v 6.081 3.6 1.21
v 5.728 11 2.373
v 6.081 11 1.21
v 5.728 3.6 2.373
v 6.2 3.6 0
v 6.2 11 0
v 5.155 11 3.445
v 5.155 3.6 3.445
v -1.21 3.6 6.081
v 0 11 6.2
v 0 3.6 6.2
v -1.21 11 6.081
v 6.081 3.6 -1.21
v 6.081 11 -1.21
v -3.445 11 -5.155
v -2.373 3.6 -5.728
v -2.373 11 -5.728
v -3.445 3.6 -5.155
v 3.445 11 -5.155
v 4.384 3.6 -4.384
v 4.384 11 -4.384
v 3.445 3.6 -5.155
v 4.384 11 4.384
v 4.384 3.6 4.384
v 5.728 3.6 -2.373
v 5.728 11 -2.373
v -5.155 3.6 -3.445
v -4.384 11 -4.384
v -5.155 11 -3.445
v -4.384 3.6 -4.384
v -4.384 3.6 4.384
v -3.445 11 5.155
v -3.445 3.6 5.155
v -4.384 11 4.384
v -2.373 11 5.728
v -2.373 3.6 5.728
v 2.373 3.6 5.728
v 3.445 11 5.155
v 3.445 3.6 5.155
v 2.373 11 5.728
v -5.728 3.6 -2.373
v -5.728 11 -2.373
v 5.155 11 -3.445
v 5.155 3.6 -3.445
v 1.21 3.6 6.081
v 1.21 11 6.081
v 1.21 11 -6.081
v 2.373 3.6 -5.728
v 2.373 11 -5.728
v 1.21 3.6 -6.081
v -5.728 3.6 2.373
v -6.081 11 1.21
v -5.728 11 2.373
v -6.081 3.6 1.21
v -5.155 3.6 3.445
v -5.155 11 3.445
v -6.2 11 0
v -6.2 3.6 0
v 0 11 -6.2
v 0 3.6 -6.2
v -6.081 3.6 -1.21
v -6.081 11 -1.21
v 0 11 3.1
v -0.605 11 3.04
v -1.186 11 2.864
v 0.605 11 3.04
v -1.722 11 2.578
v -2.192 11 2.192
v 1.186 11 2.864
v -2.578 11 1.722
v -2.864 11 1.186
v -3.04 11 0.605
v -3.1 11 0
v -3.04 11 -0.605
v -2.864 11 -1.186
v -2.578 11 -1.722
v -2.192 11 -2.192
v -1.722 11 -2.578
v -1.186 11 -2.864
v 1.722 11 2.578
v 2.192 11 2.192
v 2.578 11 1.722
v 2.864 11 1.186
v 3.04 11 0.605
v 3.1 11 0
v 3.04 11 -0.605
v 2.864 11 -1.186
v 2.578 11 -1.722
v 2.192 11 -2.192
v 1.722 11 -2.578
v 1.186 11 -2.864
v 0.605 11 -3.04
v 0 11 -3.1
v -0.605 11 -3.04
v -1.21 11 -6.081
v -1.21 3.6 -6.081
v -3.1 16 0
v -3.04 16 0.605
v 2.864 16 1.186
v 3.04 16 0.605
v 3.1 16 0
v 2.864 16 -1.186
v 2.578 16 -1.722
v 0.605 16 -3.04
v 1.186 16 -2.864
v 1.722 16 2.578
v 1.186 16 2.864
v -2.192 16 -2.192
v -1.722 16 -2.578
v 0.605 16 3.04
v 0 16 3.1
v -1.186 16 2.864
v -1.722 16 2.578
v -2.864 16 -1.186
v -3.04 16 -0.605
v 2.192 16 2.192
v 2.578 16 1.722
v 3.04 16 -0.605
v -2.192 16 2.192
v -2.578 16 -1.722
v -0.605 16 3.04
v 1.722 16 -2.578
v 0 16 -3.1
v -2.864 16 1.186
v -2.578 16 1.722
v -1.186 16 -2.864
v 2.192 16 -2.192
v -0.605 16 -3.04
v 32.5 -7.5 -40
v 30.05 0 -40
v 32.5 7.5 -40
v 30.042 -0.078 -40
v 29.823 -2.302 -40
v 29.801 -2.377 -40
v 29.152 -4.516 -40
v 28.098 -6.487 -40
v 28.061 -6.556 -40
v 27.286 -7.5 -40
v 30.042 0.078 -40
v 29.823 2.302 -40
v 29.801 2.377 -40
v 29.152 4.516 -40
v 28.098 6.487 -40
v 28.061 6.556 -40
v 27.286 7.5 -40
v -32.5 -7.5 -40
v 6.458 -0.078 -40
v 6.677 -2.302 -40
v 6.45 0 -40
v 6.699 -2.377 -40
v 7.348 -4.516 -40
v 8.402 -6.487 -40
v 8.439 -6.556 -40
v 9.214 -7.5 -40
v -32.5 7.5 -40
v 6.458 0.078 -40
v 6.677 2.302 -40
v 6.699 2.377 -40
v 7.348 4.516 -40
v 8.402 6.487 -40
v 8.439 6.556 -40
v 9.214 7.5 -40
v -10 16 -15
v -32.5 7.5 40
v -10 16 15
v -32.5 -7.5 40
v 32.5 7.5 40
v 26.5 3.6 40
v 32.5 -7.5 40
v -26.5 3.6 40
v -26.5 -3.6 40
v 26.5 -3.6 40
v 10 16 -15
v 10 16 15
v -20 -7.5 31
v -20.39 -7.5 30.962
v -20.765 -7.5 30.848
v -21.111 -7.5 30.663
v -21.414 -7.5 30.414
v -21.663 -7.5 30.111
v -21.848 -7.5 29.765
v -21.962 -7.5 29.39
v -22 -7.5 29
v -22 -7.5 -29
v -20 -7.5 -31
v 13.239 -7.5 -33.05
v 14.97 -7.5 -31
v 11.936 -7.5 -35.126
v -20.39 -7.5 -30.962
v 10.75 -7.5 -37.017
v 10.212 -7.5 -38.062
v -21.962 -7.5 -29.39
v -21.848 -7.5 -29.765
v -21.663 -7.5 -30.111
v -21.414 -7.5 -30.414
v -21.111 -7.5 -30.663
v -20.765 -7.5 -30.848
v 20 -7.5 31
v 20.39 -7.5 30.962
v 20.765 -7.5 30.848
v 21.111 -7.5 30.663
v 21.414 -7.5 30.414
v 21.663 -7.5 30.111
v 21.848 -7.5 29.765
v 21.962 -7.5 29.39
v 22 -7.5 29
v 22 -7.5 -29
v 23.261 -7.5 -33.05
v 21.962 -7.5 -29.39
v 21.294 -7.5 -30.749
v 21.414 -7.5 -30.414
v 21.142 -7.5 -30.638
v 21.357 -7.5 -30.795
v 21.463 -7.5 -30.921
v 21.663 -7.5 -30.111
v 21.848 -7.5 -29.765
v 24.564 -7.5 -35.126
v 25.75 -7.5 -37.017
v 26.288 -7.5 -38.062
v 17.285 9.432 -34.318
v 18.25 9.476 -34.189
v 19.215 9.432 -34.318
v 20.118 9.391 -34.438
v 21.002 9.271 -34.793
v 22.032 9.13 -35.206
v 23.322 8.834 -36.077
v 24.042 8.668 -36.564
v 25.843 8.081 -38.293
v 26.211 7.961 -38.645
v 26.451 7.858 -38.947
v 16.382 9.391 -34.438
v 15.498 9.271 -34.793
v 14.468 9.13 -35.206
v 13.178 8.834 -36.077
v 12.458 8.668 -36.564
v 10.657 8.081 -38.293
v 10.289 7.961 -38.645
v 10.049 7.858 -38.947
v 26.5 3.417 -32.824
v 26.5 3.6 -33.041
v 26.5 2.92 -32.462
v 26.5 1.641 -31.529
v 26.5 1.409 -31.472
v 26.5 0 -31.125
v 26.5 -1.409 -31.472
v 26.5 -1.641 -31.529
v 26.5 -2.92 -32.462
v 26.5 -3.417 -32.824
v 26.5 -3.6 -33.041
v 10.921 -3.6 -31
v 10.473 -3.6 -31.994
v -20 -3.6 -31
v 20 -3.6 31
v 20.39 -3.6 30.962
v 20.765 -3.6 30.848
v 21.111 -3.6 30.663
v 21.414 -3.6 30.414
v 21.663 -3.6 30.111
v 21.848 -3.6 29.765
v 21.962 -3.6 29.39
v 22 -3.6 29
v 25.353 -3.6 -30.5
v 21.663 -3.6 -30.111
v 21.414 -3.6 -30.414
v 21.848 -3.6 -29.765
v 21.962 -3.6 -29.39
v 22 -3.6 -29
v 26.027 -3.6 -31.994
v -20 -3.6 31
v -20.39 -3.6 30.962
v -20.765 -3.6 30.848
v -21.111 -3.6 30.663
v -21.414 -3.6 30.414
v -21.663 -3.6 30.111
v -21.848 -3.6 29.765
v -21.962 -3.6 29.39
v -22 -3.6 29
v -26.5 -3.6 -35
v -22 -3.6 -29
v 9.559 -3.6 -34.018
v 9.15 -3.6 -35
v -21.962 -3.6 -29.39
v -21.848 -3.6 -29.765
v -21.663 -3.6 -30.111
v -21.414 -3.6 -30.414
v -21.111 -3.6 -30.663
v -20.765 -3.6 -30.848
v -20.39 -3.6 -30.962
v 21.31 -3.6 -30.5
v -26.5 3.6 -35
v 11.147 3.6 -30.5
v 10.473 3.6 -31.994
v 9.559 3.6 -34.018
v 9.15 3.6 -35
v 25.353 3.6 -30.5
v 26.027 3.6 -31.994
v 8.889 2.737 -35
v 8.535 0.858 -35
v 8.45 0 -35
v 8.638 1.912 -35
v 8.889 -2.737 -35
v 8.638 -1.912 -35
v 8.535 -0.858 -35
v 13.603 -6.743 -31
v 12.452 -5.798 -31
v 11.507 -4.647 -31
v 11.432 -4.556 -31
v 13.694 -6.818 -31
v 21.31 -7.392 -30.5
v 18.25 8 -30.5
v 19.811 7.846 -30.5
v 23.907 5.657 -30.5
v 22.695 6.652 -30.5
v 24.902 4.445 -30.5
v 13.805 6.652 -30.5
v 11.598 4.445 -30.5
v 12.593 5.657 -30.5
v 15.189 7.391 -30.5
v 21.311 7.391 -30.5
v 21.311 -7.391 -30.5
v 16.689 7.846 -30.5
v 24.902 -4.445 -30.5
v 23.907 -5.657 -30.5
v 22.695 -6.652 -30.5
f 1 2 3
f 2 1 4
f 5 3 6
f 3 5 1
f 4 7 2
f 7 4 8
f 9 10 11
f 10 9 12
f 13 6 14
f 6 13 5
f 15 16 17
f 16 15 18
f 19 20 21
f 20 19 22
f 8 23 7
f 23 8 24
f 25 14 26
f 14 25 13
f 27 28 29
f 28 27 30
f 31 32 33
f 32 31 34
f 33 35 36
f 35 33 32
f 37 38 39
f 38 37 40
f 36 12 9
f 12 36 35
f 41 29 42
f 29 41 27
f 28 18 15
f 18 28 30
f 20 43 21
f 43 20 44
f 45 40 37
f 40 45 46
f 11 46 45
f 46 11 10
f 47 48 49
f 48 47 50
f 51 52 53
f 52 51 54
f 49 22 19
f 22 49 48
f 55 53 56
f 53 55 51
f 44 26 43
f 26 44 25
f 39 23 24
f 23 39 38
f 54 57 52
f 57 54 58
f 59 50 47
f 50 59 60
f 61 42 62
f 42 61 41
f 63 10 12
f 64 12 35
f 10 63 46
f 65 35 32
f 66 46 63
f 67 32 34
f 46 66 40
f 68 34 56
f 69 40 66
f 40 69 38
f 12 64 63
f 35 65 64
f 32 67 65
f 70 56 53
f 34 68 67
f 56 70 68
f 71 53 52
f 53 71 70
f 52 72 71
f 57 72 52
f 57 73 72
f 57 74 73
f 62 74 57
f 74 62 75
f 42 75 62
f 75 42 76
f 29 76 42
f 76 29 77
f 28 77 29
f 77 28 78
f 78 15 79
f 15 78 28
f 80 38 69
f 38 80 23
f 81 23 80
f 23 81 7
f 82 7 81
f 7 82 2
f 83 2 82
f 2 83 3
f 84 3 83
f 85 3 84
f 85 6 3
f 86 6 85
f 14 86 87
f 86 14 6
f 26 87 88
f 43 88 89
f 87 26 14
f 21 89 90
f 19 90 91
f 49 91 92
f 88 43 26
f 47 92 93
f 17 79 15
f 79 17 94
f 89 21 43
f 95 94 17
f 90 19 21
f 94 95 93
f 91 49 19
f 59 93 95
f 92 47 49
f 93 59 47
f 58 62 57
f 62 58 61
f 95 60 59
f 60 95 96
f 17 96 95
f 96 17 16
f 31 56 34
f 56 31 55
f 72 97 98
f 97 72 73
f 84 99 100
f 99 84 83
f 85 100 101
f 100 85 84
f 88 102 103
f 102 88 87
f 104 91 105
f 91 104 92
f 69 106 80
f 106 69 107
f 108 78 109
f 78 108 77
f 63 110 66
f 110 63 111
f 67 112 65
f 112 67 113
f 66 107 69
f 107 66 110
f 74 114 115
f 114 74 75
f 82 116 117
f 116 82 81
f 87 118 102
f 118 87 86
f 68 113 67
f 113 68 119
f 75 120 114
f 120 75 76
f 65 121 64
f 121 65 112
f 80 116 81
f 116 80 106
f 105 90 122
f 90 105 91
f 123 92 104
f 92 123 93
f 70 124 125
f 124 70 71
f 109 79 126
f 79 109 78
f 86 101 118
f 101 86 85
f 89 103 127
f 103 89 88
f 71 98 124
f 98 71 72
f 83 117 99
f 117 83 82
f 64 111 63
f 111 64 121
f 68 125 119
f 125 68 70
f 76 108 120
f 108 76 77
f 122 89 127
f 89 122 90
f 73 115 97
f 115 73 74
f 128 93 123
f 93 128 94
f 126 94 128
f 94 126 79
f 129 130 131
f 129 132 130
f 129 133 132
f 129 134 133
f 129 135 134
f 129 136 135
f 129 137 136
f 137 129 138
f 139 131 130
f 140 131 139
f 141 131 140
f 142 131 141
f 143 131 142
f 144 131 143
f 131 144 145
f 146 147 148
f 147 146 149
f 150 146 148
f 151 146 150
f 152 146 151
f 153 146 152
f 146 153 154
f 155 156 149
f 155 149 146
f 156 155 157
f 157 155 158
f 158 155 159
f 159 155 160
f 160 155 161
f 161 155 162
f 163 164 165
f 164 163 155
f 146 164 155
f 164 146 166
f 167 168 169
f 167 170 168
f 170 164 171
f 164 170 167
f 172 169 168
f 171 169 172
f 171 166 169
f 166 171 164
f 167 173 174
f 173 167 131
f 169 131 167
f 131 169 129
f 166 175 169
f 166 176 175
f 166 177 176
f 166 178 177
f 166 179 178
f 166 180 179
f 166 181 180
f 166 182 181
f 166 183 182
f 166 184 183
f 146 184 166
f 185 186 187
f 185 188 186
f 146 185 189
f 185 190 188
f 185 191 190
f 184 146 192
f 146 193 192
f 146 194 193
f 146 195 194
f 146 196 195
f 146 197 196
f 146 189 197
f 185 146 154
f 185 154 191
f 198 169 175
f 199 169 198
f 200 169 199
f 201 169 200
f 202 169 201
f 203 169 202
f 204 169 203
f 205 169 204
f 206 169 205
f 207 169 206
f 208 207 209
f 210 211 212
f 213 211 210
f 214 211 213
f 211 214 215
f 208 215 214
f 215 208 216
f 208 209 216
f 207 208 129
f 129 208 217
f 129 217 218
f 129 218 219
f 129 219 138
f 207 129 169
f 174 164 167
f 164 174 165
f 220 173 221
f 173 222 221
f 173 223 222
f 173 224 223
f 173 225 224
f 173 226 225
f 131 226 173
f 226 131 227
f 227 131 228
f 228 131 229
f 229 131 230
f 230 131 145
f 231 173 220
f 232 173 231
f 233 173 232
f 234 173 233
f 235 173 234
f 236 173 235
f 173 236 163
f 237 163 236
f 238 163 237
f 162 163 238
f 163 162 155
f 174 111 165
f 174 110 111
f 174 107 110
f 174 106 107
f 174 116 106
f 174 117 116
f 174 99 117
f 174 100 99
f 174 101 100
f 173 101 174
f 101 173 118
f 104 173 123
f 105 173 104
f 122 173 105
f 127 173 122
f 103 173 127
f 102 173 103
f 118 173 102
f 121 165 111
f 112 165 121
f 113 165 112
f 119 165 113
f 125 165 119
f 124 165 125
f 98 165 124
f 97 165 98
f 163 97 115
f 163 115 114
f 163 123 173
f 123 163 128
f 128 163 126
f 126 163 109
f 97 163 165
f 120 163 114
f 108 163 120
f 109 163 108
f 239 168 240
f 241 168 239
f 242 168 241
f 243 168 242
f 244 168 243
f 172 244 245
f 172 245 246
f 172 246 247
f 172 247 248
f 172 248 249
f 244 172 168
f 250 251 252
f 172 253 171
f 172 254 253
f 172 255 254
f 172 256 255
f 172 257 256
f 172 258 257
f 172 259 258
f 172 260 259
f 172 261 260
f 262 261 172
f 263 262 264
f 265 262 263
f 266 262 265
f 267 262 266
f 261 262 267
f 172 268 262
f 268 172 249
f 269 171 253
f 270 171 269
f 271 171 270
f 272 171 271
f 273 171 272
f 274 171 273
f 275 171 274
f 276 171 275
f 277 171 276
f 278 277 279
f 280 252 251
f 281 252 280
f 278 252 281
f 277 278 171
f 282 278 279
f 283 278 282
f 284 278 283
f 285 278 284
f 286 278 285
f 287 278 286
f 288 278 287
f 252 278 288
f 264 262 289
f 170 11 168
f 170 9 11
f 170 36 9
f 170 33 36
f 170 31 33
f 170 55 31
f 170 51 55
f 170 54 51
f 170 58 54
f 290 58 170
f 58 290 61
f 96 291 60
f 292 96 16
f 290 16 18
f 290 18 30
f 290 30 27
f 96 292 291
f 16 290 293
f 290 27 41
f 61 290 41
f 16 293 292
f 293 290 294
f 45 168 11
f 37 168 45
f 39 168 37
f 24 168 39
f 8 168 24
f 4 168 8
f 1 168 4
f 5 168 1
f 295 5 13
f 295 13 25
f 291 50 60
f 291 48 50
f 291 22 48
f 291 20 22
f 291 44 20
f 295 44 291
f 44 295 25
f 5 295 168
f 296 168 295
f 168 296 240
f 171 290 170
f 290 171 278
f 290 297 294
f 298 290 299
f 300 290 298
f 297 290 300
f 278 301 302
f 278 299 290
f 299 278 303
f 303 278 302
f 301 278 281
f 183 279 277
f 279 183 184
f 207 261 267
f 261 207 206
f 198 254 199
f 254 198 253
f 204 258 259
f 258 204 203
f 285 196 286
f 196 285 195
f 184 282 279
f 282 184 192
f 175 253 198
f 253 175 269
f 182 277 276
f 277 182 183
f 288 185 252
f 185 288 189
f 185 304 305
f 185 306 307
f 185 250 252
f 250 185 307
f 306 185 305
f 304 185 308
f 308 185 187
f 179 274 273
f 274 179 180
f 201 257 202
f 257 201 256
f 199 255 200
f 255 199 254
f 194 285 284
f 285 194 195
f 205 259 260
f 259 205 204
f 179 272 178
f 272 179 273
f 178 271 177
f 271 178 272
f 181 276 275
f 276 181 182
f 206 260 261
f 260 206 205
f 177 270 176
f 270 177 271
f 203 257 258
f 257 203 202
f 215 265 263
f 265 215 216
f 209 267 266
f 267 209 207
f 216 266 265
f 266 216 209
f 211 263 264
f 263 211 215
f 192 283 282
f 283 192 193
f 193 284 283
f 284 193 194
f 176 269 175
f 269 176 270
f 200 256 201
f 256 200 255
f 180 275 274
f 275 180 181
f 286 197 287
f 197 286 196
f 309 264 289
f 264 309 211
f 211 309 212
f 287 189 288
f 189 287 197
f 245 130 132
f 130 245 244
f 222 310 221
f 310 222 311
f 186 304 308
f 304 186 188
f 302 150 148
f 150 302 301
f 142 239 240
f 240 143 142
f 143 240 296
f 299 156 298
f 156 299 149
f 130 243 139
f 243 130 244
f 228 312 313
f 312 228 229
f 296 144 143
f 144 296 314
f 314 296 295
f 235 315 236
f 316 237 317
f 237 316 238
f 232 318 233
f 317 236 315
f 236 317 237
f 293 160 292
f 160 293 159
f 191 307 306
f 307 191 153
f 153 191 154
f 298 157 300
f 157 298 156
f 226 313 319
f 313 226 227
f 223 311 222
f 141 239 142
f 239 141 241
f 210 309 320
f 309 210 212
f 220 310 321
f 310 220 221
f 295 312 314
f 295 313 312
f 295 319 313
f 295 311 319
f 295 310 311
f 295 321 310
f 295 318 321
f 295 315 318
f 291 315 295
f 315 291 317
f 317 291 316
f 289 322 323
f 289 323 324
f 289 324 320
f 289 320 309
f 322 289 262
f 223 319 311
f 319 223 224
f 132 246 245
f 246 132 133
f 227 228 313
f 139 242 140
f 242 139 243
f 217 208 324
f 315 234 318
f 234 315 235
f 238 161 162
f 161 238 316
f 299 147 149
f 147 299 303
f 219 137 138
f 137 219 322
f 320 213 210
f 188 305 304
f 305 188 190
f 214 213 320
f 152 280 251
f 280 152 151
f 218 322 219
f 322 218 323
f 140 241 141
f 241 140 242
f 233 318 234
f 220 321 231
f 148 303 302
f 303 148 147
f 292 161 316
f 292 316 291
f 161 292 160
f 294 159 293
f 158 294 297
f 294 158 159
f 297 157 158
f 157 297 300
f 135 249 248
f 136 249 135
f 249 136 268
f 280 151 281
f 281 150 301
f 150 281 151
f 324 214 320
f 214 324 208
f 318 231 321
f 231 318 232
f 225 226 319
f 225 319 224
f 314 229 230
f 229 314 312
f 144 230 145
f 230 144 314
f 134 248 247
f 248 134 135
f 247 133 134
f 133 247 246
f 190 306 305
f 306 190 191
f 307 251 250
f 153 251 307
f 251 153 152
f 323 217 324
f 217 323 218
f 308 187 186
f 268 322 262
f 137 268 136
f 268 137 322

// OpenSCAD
// file: iPod_nano_4gen_bike_mount.scad
$fn=50;

// iPod nano 4th gen, measured lying on its back
ipod_n4_depth=70;        // top to bottom when looking at the display
ipod_n4_width=53;        // left ro right when looking at the display
ipod_n4_edge_radius=5.3; // radius of circle describing the edge's radius

// tiefe komplett: 6.6
// höhe: 70

module iPodShape(x=58, y=100, r1=4.8,r2=2.8) {
    hull() {
        for( xoff = [-x/2+r1,x/2-r1]) {
            for( yoff = [-y/2+r1,y/2-r1]) {
                translate([xoff,yoff,0]) union() {
                    difference() {
                        sphere(r=r1, center=true);
                        translate([0,0,r1]) cube(2*r1,center=true);
                    }
                    scale([1,1,r2/r1]) sphere(r=r1, center=true);
                }
            }
        }
    }
}

// this will be attached to the bike's handles
module iPod_Stand_Groundplate(width, lenght, height) {
	x=width;
    y=length;
    z=height;
    union() {
        cube([x,y,z], center=true);
    }
}

//iPod_nano_g4_stampout(ipod_n4_width, ipod_n4_depth, 2, ipod_n4_edge_radius);
//iPod_Stand_Groundplate(ipod_n4_width+0.5, ipod_n4_depth+0.5, 0.2);
// main file
include <iPod_nano_4gen_bike_mount.scad>

$fn=32;

rotate([90,0,0])
difference() {
    /*
    translate([0,0,-1]) cube([65,1,12],center=true);
    iPodShape();
    */
    //union() {
    hull() {
        cube([65,80,15], center=true);
        translate([0,0,-7-9/2]) cube([20,30,9],center=true);
    }
    translate([0,50-80/2+5,0]) cube([53,100,7.2], center=true);
    //translate([0,50-80/2+5,1]) iPodShape();
    translate([0,0,25])
    hull() {
        for(x=[-44/2+4/2,44/2-4/2]) {
            for(y=[-62/2+4/2,62/2-4/2]) {
                translate([x,y,0]) rotate([0,0,0]) cylinder(r=4/2,h=50,center=true);
            }
        }
    }
    translate([52.5/2-8,-62/2+0.5,0]) rotate([90,0,0]) union() {
        cylinder(r1=8,r2=12,h=10);
    }
    translate([0,0,-11]) union(){
        translate([0,0,50]) cylinder(r=6.2, h=100, center=true);
        translate([0,0,0]) cylinder(r=3.1, h=100, center=true);
    }
}
